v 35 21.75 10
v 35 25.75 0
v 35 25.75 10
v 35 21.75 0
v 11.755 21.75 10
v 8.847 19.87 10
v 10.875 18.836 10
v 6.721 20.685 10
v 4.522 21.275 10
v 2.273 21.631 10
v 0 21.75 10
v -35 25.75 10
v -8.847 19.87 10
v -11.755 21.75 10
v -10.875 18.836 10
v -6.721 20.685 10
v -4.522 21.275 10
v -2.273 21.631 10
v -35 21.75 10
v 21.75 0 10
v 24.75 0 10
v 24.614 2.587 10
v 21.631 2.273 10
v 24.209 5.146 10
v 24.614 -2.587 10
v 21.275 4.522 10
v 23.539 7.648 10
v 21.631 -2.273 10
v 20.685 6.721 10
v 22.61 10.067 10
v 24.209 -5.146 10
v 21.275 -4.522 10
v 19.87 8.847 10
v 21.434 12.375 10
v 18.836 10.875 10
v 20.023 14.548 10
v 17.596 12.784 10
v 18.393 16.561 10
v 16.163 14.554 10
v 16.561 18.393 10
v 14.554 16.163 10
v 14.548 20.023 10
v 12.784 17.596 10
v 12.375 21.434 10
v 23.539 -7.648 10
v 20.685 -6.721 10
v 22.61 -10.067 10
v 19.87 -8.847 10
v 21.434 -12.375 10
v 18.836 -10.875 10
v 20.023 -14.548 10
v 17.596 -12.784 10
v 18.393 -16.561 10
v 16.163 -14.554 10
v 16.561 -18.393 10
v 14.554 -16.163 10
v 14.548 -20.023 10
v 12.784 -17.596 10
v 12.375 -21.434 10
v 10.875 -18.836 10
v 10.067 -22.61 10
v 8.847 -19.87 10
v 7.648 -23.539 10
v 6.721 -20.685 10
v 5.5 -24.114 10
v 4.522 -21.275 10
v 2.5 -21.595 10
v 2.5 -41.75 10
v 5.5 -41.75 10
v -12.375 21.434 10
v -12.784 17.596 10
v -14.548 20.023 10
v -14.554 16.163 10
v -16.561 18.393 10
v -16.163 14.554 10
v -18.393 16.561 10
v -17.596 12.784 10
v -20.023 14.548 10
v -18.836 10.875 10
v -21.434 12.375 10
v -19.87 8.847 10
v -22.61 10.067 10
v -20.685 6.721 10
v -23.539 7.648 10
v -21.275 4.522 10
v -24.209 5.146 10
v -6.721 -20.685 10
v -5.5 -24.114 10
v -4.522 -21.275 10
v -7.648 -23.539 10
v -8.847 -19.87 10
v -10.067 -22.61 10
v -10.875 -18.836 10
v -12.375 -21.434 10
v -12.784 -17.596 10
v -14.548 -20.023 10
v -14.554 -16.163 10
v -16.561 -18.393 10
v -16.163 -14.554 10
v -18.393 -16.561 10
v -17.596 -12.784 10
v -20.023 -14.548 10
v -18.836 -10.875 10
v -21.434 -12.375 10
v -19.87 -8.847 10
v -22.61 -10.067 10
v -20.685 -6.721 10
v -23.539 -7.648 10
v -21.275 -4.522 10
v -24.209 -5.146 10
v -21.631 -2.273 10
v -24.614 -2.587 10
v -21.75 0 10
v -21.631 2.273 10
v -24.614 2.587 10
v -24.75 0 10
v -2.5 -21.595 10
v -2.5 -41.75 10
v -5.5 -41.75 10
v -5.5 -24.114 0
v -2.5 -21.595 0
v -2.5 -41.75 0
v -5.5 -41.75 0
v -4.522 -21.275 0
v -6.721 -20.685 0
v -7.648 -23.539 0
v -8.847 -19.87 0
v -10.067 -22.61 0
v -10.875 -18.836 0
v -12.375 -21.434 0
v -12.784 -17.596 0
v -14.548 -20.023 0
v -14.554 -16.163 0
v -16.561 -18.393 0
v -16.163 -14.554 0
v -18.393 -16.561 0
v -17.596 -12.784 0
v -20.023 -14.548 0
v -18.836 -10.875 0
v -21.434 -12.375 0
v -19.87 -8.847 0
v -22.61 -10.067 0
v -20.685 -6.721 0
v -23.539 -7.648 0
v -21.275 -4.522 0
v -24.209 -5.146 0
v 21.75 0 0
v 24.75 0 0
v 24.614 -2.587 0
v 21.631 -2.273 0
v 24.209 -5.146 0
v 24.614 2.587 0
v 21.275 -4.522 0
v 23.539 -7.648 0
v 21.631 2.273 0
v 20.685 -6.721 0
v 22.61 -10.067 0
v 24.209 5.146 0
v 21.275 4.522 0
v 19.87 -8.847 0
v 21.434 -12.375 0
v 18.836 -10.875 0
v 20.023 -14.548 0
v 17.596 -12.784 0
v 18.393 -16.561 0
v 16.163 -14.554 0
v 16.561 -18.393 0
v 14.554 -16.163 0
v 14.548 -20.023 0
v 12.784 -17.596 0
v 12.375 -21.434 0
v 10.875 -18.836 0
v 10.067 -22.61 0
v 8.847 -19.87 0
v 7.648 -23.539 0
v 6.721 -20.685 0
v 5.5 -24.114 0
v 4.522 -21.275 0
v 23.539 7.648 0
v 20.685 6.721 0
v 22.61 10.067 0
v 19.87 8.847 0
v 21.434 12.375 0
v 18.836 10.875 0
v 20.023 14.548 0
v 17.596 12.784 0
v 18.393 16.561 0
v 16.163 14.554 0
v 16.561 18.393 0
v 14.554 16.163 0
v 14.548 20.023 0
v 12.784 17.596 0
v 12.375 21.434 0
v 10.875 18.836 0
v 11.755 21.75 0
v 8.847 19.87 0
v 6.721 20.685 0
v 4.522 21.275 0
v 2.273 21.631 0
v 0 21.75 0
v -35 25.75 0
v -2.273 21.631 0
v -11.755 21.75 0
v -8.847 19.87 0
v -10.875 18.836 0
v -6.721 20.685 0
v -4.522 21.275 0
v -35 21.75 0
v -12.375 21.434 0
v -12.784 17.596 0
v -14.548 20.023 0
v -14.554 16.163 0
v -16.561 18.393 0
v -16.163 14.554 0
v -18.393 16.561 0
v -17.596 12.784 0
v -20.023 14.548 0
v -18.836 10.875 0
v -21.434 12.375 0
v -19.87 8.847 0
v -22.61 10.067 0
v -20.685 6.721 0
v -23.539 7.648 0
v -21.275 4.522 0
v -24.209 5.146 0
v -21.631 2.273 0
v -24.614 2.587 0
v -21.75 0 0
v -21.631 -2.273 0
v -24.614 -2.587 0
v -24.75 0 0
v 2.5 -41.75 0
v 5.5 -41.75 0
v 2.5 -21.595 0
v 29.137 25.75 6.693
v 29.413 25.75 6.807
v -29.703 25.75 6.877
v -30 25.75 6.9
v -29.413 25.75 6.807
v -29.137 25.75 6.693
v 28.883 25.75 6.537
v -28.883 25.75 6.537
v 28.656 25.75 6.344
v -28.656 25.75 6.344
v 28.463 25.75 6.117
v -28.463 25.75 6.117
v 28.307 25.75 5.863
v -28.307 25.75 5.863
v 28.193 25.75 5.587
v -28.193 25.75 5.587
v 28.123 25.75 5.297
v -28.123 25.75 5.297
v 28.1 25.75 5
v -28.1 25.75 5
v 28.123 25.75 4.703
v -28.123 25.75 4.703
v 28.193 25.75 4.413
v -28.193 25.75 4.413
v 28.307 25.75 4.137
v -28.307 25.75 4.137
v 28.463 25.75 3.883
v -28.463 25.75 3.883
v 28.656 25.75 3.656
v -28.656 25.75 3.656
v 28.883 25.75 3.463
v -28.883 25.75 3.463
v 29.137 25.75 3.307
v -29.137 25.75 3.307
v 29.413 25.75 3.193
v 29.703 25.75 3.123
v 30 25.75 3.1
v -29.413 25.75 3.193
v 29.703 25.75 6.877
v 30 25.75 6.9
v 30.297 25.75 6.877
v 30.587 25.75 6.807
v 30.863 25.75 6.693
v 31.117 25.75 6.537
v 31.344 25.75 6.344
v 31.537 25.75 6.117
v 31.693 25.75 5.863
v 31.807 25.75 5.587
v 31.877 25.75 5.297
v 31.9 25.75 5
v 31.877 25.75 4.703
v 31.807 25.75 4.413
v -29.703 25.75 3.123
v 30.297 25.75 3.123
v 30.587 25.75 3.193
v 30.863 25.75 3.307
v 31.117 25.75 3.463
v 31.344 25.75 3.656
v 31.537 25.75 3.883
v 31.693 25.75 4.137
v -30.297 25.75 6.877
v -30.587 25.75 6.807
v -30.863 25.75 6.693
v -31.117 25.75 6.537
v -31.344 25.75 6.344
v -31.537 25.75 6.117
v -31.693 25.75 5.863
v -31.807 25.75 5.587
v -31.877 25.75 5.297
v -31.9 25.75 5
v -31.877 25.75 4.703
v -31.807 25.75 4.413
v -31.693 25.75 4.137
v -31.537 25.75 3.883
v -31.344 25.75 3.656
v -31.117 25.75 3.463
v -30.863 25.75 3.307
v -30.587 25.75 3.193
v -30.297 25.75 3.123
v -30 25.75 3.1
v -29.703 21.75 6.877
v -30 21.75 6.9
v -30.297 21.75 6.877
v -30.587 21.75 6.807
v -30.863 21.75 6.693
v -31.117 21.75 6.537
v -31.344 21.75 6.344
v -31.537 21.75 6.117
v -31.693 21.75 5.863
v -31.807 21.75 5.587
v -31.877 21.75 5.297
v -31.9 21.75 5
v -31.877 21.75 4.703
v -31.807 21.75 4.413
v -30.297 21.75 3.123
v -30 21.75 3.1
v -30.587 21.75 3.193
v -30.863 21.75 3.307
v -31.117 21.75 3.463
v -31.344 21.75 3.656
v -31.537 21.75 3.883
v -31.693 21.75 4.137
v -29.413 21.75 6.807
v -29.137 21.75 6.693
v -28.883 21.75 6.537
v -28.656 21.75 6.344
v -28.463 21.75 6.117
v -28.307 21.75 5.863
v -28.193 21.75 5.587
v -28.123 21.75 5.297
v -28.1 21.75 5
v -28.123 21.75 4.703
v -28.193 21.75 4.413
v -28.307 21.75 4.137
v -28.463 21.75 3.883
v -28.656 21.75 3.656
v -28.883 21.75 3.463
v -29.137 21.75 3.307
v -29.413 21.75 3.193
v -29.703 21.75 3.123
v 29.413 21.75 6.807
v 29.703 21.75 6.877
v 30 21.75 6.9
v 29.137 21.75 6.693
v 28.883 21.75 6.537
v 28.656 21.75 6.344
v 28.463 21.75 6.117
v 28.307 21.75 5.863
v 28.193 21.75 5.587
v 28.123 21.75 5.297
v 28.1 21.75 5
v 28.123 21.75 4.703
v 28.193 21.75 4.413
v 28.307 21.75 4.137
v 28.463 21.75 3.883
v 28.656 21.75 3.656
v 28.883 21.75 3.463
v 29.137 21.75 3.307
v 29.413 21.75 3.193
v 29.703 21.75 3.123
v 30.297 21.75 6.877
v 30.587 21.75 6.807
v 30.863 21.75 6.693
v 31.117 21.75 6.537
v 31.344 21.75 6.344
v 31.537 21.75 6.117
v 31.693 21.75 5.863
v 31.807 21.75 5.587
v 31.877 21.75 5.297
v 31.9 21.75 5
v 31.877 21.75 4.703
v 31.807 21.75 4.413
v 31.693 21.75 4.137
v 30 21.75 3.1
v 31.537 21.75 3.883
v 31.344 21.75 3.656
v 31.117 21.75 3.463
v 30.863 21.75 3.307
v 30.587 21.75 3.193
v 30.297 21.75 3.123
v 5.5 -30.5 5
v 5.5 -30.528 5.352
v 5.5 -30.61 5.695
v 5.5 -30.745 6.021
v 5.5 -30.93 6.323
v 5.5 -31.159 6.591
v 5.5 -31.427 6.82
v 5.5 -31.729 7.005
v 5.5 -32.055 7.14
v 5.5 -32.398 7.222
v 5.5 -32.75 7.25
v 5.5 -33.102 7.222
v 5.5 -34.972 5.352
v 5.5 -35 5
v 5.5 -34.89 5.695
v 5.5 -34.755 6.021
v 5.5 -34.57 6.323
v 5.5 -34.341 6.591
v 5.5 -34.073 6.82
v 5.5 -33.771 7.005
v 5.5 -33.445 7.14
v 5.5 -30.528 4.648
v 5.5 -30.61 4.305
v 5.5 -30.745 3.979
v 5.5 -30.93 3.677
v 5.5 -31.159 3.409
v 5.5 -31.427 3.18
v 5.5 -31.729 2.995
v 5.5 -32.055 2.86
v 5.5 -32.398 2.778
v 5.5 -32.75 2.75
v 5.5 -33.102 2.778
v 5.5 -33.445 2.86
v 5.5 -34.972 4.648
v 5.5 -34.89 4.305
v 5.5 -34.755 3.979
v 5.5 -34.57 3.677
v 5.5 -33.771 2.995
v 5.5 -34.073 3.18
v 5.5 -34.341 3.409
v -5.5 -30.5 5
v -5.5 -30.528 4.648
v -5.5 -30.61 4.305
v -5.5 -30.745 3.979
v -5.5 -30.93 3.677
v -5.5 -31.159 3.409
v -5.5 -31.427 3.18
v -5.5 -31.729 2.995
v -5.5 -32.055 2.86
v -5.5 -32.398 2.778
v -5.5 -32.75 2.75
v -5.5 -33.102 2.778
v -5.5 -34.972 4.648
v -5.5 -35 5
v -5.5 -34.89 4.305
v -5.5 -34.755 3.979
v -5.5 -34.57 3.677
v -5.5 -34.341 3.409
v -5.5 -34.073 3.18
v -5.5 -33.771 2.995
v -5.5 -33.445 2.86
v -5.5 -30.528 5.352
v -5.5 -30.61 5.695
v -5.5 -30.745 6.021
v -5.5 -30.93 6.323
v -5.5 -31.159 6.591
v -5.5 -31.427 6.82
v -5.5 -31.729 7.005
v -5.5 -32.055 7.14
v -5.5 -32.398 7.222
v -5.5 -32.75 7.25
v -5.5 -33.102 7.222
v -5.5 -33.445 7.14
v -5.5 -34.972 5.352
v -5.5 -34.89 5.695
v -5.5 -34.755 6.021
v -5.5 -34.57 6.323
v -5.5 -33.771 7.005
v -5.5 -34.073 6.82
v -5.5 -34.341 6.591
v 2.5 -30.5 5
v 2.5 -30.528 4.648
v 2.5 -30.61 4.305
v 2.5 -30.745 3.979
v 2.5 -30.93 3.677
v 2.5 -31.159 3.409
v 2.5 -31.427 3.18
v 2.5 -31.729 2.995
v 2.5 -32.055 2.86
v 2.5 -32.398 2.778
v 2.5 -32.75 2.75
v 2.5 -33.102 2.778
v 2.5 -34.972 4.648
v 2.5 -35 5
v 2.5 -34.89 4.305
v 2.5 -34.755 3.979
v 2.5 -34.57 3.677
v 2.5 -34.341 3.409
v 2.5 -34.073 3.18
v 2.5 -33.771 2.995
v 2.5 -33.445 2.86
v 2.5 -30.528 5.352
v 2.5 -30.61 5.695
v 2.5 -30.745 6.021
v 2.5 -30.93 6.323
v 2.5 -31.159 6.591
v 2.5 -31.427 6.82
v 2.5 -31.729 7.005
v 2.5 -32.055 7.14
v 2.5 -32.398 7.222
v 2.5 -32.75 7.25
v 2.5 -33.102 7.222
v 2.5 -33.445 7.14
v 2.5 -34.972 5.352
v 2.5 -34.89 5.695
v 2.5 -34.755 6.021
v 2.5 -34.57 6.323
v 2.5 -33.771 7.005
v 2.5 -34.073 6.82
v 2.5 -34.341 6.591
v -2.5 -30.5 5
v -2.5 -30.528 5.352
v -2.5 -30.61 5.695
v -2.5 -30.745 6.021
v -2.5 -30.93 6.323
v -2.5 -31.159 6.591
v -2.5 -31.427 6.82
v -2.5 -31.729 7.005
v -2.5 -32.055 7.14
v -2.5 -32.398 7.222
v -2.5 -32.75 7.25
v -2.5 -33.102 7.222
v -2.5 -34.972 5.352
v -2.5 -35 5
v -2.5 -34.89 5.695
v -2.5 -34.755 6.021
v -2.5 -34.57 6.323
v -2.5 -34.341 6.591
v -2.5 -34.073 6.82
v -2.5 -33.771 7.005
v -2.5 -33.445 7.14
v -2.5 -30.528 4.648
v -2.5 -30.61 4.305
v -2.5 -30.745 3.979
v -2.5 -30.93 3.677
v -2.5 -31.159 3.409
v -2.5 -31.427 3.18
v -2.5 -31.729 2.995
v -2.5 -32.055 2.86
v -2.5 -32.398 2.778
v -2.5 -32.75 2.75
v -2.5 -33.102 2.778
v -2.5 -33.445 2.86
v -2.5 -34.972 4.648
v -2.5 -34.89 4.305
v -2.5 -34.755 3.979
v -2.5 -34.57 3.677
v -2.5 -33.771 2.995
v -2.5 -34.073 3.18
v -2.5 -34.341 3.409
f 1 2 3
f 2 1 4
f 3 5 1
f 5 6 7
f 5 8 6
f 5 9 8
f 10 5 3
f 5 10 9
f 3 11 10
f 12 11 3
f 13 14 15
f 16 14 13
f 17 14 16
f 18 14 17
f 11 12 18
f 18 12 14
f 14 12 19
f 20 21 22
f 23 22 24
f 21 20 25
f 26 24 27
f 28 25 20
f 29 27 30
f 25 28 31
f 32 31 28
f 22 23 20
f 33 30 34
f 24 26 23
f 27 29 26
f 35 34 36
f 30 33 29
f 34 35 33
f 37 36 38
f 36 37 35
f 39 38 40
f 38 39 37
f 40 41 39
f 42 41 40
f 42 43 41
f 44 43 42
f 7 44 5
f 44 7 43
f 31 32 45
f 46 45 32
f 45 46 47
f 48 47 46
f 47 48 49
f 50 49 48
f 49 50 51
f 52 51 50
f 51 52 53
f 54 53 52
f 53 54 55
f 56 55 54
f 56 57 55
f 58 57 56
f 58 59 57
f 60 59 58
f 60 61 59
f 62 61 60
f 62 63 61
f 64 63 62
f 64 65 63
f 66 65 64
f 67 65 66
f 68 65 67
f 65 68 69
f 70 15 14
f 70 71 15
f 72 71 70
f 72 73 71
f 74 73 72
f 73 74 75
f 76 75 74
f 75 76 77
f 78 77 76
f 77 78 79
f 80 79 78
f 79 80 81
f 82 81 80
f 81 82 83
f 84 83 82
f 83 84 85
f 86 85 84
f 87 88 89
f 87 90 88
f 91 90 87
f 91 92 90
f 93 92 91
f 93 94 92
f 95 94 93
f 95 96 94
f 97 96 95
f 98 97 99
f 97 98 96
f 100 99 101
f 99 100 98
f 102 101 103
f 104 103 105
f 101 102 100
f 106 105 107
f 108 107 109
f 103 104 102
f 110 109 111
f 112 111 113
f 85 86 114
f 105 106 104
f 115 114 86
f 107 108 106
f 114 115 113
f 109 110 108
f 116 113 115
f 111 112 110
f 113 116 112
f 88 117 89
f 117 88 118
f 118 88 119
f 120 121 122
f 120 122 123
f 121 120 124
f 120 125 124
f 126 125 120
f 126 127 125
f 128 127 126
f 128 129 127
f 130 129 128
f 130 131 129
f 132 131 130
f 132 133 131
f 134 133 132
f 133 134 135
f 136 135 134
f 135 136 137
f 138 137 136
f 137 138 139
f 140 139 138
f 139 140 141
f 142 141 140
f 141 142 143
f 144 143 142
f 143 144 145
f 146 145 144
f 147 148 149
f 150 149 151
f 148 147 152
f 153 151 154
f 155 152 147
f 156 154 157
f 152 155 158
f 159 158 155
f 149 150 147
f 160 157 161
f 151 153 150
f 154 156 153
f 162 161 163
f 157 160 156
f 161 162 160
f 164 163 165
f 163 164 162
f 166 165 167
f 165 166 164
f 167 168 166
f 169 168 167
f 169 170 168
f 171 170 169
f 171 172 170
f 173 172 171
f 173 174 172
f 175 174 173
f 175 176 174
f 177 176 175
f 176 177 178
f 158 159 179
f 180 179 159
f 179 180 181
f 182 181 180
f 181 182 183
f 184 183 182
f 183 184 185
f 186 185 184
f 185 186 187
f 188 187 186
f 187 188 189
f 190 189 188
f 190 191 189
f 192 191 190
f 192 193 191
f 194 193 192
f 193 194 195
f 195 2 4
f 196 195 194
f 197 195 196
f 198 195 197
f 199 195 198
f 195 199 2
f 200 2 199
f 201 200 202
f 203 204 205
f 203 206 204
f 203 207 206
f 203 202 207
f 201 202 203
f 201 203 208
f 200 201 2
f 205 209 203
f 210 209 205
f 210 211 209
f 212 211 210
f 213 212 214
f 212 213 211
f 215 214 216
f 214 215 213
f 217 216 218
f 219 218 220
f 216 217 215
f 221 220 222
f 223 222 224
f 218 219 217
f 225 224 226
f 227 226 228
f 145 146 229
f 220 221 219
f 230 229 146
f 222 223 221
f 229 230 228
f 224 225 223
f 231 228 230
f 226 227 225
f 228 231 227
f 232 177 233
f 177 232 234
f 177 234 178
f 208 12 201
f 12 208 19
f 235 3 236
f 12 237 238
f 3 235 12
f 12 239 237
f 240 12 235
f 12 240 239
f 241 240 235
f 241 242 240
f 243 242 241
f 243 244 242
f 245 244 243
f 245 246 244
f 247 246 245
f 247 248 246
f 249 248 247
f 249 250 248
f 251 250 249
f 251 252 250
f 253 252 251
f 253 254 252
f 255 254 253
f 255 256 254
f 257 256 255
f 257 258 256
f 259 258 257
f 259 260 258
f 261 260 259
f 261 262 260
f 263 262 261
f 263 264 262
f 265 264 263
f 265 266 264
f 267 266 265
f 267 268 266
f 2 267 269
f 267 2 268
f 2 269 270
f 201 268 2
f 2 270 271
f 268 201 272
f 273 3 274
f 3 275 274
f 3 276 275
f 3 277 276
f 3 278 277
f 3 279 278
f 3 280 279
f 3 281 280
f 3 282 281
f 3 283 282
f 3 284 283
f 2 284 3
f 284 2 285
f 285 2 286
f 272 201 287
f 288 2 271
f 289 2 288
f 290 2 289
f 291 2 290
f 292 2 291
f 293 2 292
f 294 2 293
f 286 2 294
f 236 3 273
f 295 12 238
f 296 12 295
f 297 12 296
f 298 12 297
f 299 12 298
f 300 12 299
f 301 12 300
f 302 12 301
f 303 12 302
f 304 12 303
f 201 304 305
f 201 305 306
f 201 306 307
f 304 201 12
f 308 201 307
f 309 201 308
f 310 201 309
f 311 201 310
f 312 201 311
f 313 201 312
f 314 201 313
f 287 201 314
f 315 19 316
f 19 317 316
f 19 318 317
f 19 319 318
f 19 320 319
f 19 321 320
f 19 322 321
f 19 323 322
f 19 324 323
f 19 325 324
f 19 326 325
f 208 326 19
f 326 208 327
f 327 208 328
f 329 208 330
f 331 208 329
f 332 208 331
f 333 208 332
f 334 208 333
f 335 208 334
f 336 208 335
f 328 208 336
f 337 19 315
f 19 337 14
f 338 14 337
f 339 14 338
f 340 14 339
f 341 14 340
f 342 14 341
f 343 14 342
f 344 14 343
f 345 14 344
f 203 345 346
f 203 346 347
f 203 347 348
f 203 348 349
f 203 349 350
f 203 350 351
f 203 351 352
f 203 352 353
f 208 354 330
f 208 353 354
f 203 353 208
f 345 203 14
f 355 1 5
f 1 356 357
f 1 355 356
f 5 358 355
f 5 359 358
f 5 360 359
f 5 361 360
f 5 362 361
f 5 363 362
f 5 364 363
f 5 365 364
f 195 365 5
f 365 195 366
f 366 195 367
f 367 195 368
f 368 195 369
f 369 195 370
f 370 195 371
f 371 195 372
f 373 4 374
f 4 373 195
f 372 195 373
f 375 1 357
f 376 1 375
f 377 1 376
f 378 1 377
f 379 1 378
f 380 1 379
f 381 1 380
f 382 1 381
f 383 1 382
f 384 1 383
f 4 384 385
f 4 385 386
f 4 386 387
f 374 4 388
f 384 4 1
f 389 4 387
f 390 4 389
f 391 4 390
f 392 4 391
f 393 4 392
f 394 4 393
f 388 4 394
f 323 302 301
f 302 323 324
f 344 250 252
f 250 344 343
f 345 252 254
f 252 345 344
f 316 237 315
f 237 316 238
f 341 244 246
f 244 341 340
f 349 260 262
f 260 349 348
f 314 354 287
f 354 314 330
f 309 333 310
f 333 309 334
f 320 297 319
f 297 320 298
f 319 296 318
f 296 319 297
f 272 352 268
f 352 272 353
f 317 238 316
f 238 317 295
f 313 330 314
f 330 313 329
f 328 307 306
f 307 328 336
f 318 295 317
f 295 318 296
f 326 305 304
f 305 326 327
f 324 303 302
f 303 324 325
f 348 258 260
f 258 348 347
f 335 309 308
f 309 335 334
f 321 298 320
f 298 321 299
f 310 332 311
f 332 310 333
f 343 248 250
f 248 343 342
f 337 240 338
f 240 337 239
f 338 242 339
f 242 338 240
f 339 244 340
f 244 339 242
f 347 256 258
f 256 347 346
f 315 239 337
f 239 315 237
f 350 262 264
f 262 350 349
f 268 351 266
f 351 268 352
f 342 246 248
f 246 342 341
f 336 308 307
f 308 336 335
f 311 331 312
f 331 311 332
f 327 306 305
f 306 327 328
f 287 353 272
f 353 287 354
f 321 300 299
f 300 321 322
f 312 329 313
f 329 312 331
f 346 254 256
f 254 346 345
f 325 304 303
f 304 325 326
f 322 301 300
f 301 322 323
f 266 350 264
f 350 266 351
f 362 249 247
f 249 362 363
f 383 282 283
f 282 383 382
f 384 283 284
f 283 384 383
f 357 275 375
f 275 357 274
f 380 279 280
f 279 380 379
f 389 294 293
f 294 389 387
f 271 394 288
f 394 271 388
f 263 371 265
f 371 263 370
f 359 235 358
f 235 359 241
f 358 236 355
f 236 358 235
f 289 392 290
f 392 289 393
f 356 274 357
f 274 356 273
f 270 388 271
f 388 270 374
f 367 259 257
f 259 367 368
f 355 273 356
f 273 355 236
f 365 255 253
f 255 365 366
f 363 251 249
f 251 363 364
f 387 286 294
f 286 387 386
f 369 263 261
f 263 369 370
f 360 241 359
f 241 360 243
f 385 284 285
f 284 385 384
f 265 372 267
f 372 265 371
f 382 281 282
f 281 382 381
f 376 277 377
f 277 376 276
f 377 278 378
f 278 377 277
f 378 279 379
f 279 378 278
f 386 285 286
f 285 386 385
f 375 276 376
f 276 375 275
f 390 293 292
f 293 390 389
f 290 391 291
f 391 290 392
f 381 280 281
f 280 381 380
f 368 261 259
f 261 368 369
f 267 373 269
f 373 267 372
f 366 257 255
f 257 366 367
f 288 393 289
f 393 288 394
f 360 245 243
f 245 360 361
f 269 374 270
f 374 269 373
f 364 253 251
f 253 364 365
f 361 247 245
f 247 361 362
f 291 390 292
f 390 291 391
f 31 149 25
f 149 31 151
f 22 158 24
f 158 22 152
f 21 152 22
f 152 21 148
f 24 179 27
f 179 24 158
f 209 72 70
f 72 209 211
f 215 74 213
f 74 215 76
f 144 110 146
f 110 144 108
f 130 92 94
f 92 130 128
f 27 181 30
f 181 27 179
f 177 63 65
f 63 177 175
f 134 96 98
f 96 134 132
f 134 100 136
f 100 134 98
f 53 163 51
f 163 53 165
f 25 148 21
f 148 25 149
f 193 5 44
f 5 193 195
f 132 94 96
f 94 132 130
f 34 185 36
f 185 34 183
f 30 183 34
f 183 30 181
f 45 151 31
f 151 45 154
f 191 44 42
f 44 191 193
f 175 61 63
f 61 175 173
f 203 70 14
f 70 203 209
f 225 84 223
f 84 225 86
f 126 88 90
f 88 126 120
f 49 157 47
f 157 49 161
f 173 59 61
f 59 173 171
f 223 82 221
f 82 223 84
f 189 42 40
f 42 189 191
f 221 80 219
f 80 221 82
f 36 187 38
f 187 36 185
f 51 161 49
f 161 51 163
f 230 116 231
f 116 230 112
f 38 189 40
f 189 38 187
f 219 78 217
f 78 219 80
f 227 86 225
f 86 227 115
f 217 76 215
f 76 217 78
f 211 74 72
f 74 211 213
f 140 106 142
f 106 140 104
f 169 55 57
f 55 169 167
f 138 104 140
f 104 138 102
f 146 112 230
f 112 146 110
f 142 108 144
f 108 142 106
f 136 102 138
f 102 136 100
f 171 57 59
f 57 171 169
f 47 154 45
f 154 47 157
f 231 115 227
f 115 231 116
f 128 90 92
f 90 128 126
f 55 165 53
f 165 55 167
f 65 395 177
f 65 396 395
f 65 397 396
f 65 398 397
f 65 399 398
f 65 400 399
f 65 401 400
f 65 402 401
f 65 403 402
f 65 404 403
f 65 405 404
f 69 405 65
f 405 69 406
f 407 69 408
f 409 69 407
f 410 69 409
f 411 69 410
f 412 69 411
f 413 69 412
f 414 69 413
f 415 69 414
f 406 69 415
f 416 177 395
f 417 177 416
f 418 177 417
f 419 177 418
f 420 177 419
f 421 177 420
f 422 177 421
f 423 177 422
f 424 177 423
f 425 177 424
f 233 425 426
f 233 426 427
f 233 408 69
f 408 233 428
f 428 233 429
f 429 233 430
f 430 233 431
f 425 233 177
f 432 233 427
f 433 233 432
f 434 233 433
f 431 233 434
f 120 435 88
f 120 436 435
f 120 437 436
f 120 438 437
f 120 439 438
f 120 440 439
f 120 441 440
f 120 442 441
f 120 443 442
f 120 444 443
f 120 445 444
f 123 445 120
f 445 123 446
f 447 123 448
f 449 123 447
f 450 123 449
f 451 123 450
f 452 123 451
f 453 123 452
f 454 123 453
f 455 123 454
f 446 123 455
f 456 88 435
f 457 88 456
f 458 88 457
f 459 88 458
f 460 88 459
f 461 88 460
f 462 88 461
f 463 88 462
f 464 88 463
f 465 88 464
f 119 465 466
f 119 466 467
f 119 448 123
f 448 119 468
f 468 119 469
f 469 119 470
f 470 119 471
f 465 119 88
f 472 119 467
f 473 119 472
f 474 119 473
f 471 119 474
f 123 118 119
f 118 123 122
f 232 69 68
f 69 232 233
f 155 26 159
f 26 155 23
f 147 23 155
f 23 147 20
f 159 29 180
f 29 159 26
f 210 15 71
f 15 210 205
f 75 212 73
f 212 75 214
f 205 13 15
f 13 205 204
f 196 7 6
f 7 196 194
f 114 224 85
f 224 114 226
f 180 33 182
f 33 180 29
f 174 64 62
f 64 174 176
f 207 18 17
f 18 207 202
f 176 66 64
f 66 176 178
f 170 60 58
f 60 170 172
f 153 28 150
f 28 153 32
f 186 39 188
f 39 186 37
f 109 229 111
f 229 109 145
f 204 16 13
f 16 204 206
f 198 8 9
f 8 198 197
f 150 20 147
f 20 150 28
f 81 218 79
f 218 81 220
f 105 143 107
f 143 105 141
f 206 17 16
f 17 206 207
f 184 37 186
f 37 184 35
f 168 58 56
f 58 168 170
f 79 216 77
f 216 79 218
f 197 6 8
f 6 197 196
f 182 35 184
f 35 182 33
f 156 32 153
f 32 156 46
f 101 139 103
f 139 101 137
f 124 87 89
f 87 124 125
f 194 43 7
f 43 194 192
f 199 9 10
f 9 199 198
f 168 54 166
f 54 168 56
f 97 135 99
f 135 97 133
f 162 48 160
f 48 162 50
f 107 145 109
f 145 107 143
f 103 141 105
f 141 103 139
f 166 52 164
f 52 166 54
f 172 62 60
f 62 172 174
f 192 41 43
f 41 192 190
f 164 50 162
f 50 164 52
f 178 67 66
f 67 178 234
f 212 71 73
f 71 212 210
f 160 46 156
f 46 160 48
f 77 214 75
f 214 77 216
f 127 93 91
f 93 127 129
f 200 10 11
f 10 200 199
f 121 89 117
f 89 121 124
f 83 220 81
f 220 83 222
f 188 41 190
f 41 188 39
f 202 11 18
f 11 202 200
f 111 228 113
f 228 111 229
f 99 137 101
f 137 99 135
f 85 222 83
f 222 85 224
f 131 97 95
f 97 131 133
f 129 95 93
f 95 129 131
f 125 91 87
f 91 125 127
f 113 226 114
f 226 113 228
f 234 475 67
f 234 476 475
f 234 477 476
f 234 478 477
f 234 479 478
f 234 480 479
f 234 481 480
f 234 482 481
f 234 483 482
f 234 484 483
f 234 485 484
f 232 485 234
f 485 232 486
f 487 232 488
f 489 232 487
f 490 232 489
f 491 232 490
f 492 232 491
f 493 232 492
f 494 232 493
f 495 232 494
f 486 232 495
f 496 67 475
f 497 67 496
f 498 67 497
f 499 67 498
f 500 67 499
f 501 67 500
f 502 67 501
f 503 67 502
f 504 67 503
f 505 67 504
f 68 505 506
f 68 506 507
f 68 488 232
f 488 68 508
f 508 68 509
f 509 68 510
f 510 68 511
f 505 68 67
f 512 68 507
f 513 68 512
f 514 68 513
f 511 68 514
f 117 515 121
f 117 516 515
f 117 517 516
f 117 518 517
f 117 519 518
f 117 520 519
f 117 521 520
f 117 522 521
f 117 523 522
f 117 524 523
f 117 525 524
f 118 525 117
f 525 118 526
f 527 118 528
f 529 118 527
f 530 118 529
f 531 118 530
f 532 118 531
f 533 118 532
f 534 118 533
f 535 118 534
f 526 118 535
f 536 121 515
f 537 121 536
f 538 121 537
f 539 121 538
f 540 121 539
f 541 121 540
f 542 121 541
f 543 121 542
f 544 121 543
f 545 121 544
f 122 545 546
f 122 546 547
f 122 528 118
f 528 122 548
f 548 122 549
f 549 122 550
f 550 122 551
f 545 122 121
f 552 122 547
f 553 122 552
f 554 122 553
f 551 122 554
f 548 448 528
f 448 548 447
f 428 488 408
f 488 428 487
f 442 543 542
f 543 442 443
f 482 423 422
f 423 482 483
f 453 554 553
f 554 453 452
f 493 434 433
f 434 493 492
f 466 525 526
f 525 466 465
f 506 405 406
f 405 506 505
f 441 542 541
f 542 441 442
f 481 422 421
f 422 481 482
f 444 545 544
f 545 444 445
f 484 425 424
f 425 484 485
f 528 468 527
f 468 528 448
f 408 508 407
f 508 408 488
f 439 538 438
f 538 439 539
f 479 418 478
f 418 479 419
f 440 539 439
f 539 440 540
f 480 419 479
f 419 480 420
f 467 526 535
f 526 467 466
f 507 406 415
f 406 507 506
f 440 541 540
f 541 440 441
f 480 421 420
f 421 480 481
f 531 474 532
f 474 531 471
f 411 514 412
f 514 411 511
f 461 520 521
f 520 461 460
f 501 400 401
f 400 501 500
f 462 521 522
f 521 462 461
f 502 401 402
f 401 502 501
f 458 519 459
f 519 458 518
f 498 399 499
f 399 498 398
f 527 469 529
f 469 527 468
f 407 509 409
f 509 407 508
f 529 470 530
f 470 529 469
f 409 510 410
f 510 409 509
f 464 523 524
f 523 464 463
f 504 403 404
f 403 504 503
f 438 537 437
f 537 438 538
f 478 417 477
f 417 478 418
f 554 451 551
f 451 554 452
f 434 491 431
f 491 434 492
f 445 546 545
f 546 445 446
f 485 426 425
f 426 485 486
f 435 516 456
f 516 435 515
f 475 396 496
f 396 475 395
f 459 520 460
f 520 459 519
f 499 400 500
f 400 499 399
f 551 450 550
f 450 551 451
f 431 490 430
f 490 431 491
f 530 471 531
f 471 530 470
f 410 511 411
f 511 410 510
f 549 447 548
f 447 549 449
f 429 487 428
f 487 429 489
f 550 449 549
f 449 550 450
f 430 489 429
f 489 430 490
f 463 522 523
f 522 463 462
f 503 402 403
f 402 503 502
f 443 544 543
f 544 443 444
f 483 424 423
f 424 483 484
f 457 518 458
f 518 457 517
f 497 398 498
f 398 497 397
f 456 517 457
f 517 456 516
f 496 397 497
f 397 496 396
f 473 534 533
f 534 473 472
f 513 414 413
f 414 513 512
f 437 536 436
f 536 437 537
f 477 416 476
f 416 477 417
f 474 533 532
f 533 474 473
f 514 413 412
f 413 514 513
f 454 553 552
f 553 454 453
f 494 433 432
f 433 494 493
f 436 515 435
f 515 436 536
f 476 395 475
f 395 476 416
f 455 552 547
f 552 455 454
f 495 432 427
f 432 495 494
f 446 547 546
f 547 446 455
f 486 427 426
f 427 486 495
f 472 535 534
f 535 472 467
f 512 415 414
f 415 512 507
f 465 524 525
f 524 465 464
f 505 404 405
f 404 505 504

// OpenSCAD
//NO! Recall: shaker.

shaftDiameter = 42.5+1; // SCH40 PVC 3/4" OD + 1mm tolerance
clampWidth = 10;
clampThickness = 3.0 ;
clampLegLengthFromShaft = 20 ; // room for wing nut and thumb srew
clampLegThickness = clampThickness + 0 ; // default is 'clampThickness' to keep it the same thickness as the clamp
clampLegGap = 5; 
clampToClampScrewCenter = (clampLegLengthFromShaft - clampThickness) / 2 - 0.5 ; //using '(clampLegLengthFromShaft - clampThickness) / 2' nearly centres this hole on the clamp leg
clampScrewDiameter = 4.5 ; // #8 clearance hole
shaftToMountPlate = 0 ;
mountPlateThickness = 4.0 ;
mountPlateLength = 70 ;
mountHoleSpacing = 60 ;
mountHoleDiameter = 3.8 ; // #6 self threading hardware clearance hole
screwHoleSmoothness = 40; //6 = printable vertically. Applies to mount plate screw holes and clamp leg screw holes
clampSmoothness = 60 ;

clampWithMountPlate();

/*
translate([50,0,50]) clamp();
*/

module clampWithMountPlate(){
	union(){
		translate([0,shaftDiameter / 2 + shaftToMountPlate + mountPlateThickness / 2,clampWidth / 2])
			difference(){
				cube([mountPlateLength,mountPlateThickness,clampWidth], center = true);
				translate([-mountHoleSpacing / 2,0,0]) rotate([90,0,0]) cylinder(r = mountHoleDiameter / 2, h = mountPlateThickness + 2, center = true, $fn = screwHoleSmoothness);
				translate([mountHoleSpacing / 2,0,0]) rotate([90,0,0]) cylinder(r = mountHoleDiameter / 2, h = mountPlateThickness + 2, center = true, $fn = screwHoleSmoothness);
			}
		clamp();
	}
}


 module clamp(){
	difference(){
		union(){
			cylinder(r = shaftDiameter / 2 + clampThickness, h = clampWidth, $fn = clampSmoothness);
			translate([0,-(shaftDiameter / 2 + clampLegLengthFromShaft) / 2,clampWidth / 2]) cube([clampLegThickness * 2 + clampLegGap, shaftDiameter / 2 + clampLegLengthFromShaft,clampWidth], center = true);
		}
			translate([0,0,-1]) cylinder(r = shaftDiameter / 2,h = clampWidth + 2, $fn = clampSmoothness);			
			translate([0, -(shaftDiameter / 4 + clampLegLengthFromShaft ) + 0.1, clampWidth / 2]) cube([clampLegGap, shaftDiameter / 2 + clampLegLengthFromShaft * 2, clampWidth + 2], center = true);
			translate([0, -(shaftDiameter / 2 + clampThickness + clampToClampScrewCenter ), clampWidth / 2]) rotate([0, 90, 0]) cylinder(r = clampScrewDiameter / 2, h = clampLegThickness * 2 + clampLegGap + 2,center = true, $fn = screwHoleSmoothness);
	}
}
